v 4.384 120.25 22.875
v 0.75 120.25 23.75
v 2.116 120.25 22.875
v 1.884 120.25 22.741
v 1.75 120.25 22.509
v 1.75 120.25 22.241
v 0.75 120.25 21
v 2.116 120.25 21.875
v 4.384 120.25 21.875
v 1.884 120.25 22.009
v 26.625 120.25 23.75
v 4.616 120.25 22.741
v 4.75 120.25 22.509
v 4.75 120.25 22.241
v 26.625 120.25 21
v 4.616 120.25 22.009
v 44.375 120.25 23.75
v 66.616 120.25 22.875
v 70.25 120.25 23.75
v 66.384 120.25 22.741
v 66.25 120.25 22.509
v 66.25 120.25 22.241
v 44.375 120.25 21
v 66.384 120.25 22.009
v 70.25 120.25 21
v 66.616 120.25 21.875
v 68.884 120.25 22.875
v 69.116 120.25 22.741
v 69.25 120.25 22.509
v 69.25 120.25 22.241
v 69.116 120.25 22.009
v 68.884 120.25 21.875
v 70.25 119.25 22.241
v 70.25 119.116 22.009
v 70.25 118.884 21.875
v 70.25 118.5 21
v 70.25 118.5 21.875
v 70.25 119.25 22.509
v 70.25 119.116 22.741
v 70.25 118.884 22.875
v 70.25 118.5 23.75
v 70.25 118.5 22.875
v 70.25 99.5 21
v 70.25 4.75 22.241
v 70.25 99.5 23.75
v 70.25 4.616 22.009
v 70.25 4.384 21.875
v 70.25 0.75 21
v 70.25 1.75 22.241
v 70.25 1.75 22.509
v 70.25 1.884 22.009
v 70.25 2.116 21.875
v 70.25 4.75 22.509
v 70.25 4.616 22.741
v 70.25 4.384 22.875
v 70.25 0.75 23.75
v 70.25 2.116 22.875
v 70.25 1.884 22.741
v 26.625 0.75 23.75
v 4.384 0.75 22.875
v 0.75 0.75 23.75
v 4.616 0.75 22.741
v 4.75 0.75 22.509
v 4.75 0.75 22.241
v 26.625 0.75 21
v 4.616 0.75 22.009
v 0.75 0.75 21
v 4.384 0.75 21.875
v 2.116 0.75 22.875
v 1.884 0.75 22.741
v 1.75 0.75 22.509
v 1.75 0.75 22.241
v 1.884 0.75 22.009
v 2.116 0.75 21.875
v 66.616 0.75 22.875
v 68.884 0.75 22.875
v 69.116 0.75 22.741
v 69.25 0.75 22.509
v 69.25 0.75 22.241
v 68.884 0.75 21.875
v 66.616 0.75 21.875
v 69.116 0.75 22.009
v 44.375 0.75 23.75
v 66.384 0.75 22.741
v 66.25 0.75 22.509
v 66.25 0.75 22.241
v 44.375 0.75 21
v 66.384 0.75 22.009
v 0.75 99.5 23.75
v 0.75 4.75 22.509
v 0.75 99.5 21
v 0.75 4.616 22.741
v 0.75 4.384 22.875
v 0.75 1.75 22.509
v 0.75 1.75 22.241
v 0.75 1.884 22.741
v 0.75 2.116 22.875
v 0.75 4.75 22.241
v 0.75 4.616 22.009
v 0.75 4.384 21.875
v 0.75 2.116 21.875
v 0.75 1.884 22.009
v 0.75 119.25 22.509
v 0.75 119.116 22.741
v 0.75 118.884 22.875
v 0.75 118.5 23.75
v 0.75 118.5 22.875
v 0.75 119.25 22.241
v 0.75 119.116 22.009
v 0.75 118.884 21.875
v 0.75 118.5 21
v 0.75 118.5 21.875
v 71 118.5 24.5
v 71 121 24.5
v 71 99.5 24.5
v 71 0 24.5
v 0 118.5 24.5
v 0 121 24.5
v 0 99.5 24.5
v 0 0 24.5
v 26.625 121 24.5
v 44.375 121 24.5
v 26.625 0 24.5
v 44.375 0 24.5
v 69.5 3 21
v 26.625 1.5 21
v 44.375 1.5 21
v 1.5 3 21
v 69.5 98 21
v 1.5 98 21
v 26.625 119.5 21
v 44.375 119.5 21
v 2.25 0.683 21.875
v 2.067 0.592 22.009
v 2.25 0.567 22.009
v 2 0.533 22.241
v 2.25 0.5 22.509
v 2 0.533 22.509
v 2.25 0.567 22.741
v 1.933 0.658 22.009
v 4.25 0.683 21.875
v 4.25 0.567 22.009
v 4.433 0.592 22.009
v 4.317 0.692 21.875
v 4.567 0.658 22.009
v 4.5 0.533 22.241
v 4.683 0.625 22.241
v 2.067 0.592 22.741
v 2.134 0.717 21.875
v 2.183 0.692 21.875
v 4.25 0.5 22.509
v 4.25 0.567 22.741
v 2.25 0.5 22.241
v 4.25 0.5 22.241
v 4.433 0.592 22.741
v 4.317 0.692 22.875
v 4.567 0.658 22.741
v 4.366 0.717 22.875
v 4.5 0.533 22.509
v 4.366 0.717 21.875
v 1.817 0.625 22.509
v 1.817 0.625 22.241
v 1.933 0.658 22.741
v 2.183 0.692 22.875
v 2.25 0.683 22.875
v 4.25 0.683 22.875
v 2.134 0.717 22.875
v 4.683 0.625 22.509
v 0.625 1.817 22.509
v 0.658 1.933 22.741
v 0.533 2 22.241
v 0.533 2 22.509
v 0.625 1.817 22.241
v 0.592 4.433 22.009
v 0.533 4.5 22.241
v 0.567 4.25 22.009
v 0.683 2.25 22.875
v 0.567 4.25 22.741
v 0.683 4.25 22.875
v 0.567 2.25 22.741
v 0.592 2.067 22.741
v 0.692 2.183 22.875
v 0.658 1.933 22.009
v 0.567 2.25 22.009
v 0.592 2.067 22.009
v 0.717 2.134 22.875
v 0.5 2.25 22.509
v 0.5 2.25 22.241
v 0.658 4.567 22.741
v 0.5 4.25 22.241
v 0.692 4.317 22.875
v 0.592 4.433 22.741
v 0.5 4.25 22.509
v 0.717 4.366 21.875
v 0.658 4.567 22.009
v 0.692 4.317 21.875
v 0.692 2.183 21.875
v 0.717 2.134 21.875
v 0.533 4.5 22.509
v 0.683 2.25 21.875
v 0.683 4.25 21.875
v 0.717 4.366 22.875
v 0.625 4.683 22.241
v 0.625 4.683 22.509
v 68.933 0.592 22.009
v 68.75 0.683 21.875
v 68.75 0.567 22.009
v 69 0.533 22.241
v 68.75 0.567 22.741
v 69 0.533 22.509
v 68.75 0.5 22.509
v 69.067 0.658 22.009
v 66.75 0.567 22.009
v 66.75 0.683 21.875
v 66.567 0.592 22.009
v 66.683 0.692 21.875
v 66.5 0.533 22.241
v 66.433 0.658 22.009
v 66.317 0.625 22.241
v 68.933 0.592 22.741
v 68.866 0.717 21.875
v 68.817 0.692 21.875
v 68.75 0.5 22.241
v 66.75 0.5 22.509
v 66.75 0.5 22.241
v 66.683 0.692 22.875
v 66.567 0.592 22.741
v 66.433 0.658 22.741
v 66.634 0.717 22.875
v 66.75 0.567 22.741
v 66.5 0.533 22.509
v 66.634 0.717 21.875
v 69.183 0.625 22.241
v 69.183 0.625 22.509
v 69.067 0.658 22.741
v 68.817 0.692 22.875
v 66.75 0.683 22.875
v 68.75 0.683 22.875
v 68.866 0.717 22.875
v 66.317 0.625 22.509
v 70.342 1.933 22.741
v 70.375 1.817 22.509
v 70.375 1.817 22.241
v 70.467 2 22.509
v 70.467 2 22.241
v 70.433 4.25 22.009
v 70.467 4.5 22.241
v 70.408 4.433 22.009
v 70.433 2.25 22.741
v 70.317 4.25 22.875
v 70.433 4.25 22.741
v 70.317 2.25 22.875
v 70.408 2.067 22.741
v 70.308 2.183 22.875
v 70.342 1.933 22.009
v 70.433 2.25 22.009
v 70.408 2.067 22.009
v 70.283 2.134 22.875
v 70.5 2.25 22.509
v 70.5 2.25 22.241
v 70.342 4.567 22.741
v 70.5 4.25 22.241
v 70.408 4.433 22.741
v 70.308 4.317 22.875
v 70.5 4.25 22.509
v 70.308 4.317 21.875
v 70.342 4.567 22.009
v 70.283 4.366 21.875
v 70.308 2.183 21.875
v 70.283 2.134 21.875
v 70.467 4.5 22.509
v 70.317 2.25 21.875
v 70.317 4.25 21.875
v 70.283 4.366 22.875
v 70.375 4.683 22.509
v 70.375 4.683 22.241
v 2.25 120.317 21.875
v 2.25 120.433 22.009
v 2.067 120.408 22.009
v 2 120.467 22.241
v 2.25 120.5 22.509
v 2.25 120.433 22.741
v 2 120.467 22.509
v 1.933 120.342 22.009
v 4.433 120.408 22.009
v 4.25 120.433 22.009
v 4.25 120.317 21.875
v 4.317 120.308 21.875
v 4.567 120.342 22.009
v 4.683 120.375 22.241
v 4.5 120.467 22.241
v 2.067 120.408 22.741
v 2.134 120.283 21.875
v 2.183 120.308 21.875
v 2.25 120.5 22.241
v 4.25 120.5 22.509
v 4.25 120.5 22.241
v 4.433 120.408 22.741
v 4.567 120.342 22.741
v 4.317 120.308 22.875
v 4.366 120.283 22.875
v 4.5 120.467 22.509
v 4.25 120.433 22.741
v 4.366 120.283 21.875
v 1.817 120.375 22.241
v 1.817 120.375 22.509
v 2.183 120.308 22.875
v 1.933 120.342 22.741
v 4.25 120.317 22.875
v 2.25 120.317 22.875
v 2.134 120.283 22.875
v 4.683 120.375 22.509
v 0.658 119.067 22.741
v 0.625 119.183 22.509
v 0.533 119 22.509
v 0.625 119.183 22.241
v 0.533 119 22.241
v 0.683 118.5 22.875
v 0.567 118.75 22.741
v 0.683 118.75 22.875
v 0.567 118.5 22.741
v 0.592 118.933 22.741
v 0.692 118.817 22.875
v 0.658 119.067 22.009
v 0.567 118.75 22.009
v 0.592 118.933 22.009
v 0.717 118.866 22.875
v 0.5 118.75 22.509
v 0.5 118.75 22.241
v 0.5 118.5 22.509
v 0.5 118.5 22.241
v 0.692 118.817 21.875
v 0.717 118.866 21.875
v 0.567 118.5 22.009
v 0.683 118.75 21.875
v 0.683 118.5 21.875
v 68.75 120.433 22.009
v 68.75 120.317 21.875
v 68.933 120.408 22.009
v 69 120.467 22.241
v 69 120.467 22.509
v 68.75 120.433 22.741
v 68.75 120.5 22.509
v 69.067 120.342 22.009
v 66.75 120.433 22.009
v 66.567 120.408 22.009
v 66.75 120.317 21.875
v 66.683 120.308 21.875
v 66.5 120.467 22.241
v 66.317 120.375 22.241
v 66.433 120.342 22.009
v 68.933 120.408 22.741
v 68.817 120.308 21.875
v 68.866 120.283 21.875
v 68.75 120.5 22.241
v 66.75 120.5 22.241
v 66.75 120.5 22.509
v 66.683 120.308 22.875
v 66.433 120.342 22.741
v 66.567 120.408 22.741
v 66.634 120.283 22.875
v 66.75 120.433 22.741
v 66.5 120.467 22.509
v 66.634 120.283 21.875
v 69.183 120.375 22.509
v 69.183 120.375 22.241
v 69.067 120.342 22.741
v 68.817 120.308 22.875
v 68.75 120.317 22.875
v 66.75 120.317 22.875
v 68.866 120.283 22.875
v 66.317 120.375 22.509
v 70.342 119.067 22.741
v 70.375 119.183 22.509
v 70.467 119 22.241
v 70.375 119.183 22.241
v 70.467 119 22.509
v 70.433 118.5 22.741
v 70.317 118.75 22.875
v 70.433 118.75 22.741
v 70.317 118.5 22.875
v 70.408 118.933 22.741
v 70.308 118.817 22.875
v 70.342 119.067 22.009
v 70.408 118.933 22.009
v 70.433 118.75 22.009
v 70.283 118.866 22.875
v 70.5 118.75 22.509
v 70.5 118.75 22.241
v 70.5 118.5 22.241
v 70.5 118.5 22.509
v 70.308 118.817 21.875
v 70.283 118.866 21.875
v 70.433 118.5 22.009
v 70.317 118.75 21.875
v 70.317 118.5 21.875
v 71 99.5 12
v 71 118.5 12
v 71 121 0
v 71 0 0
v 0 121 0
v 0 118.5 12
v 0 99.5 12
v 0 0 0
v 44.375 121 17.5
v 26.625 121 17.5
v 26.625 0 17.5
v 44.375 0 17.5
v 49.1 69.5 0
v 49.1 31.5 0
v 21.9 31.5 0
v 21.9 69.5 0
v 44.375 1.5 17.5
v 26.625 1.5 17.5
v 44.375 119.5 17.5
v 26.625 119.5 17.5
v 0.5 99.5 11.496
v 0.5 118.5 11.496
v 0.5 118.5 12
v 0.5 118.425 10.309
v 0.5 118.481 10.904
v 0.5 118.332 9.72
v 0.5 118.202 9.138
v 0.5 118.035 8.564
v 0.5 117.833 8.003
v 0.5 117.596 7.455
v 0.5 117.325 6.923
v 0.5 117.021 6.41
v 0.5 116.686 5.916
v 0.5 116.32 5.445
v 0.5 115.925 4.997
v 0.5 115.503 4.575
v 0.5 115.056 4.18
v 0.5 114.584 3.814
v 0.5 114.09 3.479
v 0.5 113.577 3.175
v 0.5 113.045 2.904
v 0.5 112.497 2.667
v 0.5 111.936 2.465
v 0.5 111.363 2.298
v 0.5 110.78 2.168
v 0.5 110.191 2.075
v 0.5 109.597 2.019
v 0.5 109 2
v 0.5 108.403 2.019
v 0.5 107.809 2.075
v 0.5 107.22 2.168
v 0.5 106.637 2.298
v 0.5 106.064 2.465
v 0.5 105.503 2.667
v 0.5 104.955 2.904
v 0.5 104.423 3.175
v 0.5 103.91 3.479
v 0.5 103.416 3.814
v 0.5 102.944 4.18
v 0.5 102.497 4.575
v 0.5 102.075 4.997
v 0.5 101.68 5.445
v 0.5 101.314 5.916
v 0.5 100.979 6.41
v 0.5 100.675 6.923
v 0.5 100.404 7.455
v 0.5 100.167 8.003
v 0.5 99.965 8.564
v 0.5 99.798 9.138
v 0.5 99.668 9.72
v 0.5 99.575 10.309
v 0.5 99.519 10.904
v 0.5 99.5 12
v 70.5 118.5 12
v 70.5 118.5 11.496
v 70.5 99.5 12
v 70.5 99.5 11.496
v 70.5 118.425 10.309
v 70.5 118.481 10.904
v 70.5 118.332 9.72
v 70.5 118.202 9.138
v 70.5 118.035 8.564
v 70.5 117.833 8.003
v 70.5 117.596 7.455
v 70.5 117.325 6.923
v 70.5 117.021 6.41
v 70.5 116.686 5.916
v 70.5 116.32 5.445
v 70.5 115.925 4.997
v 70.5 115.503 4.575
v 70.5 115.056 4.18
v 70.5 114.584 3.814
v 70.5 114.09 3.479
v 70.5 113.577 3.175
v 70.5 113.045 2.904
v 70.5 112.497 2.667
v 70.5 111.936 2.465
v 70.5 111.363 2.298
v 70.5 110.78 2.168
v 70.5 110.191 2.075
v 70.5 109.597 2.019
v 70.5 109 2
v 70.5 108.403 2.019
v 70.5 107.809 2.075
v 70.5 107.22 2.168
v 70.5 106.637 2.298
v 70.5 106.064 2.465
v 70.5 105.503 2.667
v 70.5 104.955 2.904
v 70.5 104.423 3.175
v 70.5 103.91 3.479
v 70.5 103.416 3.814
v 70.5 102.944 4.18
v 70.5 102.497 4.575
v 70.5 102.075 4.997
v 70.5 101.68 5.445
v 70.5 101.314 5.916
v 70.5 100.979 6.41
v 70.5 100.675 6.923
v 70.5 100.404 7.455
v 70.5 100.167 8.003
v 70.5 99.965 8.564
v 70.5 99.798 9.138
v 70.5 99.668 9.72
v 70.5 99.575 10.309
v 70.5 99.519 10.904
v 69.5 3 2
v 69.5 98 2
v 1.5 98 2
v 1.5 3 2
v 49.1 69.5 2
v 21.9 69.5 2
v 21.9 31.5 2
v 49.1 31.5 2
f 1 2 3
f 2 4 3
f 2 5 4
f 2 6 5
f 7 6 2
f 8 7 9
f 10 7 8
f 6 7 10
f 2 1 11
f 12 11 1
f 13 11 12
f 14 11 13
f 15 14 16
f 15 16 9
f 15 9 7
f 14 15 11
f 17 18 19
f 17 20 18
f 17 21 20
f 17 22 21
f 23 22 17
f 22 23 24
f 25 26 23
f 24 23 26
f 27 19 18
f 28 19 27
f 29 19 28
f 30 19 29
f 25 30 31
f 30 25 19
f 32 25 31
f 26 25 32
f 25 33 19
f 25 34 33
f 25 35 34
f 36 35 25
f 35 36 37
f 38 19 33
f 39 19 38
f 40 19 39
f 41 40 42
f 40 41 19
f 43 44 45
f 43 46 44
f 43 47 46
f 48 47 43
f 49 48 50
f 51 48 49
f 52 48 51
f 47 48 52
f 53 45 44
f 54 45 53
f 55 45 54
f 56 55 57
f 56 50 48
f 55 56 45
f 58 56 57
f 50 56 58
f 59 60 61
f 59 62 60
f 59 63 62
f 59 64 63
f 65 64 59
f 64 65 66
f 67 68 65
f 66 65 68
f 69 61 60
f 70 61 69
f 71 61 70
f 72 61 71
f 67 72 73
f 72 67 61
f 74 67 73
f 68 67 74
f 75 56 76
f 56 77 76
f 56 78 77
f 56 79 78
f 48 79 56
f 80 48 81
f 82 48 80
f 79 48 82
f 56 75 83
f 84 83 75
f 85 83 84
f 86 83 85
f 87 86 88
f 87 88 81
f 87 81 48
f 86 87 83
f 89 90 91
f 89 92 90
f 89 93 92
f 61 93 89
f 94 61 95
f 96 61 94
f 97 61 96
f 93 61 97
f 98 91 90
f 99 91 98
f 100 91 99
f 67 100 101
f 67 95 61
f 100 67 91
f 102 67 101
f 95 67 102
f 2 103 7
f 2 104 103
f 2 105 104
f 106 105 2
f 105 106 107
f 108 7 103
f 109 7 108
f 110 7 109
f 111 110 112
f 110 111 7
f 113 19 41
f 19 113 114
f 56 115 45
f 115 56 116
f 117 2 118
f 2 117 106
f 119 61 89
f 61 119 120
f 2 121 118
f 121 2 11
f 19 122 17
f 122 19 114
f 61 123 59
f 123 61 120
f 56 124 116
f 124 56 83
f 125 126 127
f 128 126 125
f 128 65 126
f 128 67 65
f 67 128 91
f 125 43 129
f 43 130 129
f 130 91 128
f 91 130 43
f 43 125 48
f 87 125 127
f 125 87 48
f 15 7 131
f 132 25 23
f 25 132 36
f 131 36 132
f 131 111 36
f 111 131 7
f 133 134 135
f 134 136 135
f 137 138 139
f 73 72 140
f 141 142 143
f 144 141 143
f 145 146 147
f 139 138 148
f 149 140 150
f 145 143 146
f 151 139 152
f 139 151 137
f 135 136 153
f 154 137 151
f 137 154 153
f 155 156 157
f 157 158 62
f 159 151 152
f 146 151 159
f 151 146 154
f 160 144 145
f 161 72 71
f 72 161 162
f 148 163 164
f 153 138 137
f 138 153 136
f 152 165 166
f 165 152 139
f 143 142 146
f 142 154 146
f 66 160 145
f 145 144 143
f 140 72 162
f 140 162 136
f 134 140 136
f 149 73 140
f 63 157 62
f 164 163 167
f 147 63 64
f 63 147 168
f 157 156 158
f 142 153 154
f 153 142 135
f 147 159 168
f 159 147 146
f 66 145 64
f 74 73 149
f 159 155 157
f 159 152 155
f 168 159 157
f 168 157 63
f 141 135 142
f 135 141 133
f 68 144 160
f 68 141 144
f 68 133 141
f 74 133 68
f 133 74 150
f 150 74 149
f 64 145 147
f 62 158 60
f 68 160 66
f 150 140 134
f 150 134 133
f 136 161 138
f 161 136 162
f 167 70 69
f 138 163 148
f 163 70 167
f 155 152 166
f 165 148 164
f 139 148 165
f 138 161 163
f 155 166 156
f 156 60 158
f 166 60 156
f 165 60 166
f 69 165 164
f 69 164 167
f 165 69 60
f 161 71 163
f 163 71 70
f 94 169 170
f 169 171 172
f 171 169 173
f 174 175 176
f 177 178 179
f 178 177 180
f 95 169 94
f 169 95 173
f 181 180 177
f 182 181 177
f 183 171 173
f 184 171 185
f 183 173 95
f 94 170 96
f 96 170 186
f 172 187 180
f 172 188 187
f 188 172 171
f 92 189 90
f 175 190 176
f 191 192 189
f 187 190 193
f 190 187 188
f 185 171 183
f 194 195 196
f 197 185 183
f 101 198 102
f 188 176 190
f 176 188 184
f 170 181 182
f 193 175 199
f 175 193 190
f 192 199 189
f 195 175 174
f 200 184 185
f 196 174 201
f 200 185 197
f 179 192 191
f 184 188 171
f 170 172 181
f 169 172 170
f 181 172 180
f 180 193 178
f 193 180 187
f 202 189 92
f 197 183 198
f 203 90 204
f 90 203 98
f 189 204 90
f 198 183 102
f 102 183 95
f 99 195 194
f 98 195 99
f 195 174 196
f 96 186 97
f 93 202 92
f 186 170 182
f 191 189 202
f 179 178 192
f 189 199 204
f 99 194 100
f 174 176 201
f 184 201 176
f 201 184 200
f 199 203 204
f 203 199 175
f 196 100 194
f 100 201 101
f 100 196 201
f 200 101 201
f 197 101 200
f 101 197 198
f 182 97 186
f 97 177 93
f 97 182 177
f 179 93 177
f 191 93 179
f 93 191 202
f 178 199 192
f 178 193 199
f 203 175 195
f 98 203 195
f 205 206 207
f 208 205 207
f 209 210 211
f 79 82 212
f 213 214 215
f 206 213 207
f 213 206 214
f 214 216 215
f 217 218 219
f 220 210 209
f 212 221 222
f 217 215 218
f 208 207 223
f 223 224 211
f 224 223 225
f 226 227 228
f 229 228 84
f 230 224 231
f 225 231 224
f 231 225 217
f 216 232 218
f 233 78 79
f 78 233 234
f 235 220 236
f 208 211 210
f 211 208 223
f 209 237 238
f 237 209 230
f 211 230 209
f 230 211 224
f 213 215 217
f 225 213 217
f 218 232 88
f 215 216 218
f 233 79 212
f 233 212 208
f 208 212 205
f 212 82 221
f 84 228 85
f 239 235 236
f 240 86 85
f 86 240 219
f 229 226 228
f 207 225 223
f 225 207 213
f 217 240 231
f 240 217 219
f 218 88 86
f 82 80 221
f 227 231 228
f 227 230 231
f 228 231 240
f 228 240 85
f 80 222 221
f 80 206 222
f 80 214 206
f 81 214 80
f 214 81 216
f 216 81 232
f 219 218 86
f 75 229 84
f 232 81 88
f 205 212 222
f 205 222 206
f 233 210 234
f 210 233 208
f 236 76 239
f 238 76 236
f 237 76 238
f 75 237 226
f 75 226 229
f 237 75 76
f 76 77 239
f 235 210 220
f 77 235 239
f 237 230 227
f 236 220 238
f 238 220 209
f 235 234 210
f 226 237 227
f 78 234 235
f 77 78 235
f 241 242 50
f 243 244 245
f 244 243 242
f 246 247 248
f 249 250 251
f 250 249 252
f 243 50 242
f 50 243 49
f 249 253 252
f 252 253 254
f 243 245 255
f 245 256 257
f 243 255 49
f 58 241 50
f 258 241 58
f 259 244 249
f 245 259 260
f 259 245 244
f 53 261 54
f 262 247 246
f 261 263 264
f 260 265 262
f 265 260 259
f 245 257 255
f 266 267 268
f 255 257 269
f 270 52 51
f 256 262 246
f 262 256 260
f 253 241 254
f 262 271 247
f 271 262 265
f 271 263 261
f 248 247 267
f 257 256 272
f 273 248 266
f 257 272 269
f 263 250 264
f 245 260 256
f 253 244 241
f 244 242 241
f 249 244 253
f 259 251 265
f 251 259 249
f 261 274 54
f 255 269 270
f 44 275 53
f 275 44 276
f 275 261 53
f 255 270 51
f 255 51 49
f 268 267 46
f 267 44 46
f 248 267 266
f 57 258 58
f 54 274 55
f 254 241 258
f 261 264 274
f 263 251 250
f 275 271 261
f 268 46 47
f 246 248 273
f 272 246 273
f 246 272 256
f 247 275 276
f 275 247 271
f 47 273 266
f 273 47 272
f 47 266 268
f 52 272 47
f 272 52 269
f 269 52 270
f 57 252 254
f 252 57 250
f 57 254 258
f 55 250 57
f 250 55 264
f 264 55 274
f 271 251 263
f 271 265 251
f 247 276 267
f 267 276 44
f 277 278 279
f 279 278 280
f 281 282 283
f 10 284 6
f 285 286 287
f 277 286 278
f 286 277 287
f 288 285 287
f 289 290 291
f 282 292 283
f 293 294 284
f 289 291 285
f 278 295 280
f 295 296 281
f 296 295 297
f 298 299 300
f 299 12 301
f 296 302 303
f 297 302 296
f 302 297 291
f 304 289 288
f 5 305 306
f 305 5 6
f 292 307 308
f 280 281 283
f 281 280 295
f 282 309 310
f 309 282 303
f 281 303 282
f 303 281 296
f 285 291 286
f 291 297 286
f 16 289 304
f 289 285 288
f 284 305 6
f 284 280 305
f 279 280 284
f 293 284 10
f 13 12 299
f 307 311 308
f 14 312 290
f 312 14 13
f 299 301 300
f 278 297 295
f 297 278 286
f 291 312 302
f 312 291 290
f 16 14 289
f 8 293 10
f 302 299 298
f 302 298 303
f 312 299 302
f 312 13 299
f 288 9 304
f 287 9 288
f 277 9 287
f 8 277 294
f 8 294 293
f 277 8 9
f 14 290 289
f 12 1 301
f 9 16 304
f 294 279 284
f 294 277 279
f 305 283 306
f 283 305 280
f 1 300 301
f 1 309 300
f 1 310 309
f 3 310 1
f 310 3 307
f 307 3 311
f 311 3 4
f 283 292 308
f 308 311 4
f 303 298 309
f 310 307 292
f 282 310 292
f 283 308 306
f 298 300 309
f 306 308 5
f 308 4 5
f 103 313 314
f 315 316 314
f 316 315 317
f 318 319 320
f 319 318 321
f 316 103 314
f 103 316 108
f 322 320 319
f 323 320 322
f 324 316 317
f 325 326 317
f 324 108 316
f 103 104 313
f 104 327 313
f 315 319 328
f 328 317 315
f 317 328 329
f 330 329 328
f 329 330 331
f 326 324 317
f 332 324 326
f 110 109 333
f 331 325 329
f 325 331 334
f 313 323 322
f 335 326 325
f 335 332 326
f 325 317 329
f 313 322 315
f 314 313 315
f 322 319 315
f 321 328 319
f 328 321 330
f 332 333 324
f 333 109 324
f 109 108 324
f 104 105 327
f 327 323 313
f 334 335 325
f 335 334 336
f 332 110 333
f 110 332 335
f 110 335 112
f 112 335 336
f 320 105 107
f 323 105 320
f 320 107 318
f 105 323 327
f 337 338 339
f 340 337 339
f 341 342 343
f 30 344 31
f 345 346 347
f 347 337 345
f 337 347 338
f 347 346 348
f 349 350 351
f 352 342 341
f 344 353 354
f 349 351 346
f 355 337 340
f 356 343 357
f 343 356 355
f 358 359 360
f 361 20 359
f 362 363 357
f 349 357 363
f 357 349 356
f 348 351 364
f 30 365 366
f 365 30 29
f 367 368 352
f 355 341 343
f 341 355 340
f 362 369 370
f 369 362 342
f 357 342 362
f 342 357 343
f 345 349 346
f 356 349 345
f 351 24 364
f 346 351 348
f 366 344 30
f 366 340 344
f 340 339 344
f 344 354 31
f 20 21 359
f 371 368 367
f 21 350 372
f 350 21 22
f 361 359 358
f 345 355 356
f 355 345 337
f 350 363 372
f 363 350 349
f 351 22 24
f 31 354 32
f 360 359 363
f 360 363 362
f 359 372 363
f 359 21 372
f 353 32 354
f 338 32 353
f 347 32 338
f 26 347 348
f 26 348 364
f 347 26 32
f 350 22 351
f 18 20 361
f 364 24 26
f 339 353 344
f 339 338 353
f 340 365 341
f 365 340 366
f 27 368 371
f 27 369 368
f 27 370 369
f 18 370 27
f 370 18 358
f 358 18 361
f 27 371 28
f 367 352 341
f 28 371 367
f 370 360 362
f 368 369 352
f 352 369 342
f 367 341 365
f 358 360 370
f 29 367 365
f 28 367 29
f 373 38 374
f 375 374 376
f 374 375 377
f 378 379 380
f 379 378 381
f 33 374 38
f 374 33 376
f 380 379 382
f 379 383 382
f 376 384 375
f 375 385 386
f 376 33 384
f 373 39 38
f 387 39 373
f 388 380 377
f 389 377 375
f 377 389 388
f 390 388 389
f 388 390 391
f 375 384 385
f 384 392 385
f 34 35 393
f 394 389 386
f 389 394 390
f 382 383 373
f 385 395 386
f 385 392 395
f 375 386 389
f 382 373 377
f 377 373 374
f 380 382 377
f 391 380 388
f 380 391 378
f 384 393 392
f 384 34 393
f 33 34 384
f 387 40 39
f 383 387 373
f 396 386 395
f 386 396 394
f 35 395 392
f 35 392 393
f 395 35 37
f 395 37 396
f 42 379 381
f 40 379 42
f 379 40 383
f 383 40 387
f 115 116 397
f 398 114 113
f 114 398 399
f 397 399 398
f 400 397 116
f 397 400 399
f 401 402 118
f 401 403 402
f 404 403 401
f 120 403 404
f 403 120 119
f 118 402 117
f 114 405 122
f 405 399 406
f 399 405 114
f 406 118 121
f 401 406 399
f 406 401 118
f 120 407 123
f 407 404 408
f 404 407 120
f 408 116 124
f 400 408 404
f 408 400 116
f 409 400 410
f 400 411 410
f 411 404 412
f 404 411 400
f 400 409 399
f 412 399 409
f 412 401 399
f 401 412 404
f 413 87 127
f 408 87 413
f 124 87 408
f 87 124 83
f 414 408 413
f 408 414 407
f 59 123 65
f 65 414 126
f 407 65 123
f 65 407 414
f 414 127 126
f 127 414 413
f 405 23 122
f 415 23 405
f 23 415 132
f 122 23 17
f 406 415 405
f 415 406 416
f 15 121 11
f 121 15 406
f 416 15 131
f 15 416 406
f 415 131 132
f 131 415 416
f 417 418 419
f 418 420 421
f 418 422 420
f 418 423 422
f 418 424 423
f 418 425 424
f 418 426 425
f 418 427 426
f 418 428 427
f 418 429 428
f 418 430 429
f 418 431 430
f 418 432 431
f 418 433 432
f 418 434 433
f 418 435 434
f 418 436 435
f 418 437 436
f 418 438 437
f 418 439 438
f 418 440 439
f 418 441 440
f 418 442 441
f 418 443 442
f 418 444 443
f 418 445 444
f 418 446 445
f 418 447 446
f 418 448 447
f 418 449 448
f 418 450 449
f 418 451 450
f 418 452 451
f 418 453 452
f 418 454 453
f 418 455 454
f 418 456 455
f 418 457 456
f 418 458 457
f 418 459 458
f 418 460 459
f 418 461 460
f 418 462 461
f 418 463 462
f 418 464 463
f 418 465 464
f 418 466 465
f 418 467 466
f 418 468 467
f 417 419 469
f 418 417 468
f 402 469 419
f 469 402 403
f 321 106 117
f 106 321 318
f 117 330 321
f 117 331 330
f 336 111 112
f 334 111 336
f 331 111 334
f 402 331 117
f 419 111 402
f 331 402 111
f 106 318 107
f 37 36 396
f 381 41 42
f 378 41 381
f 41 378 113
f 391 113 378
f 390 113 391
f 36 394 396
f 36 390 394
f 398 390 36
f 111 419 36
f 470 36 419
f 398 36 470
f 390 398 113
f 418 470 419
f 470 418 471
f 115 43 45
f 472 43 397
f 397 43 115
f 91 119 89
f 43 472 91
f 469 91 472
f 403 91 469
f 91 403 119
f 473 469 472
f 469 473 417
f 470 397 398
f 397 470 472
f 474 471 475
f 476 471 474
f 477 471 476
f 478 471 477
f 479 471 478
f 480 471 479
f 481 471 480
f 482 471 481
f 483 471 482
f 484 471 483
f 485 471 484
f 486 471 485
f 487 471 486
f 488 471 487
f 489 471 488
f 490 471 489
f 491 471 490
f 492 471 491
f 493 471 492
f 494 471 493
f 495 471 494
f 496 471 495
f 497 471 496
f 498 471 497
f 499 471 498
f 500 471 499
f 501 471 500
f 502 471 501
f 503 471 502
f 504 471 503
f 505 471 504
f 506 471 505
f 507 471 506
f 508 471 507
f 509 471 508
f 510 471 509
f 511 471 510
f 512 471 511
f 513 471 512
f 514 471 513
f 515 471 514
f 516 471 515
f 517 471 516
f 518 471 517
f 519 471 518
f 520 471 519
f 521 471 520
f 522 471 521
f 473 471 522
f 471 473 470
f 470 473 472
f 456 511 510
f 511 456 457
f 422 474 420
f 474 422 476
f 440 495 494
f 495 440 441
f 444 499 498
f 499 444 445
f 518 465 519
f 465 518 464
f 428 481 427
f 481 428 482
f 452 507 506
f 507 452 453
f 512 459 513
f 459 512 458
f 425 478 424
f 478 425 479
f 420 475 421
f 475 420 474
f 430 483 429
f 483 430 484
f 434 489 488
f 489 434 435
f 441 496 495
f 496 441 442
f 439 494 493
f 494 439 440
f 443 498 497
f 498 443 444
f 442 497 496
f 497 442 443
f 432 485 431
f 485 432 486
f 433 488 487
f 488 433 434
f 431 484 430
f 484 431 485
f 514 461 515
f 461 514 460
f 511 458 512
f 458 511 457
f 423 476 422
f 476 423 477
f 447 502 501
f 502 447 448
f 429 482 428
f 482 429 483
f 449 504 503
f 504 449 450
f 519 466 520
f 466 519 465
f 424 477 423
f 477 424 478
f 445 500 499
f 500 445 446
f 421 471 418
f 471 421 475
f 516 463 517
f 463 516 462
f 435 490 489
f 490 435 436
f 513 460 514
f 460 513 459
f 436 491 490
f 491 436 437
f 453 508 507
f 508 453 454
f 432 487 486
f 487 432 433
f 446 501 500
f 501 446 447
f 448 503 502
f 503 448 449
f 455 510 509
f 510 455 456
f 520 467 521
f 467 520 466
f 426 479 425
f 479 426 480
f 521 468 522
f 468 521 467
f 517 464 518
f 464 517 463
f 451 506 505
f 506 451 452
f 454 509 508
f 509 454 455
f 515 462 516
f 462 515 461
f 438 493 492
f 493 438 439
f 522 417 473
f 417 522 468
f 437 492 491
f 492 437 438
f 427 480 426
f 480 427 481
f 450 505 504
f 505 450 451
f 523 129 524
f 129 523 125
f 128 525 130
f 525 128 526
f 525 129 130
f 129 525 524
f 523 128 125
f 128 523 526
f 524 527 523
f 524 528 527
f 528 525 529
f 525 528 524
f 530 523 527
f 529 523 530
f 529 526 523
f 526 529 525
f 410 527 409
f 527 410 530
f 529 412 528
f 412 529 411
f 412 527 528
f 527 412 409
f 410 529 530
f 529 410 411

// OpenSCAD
include <boardgame_insert_toolkit_lib.bill.scad>;

// determines whether lids are output.
g_b_print_lid = f;

// determines whether boxes are output.
g_b_print_box = t; 

// Focus on one box
g_isolated_print_box = ""; 

g_wall_thickness = 1.5;

lid_parms = 
[
    [ LID_PATTERN_RADIUS,4],        
    [ LID_INSET_B, t ],
    [ LID_TABS_4B, [ t,t,f,f]],
    [ LID_FIT_UNDER_B, f],
    [ LID_LABELS_INVERT_B, f],
 ];

function makeFaction( label ) = 
    [   label,
        [
            [ BOX_SIZE_XYZ,                 [71, 121, 21] ],    
            [ BOX_LID,
                [
                    [ LID_PATTERN_RADIUS,4],        
                    [ LID_INSET_B, t ],
                    [ LID_TABS_4B, [ t,t,f,f]],
                    [ LID_FIT_UNDER_B, f],
                    [ LID_LABELS_INVERT_B, t],
                    [ LABEL,
                        [
                            [ LBL_TEXT,     label ],
                            [ LBL_SIZE,     10 ],
                            [ ROTATION,     90 ],
                            [ LBL_FONT,     "Orthodox Herbertarian:style=Regular"],
                        ]
                    ],
                ],
            ],
                         
            // troops
            [ BOX_COMPONENT,
                [
                    [CMP_COMPARTMENT_SIZE_XYZ,[ 70, 19, 19] ],
                    [CMP_NUM_COMPARTMENTS_XY,[1,1] ], 
                    [CMP_SHAPE_ROTATED_B,t],
                    [CMP_SHAPE, ROUND ],  
                    [POSITION_XY,[CENTER, 98 ] ],   
                    [CMP_MARGIN_FBLR, [ 0, 0, 3, 3 ]],
                    [CMP_PADDING_HEIGHT_ADJUST_XY,[-9, 0] ],
                    [CMP_PADDING_XY,[15,2]],


                ]
            ],

            // cards 
            [ BOX_COMPONENT,
                [
                    [CMP_NUM_COMPARTMENTS_XY,   [1,1]],
                    [CMP_COMPARTMENT_SIZE_XYZ,  [ 68, 95, 19] ],
                    [CMP_CUTOUT_BOTTOM_B,t],
                    [CMP_CUTOUT_BOTTOM_PCT,0.4],
                    [POSITION_XY, [CENTER,1.5]],
                ]
            ],
                     
        ]
    ];

//////////////////

data =
[

    //makeFaction( "ATREIDES" ),
    //makeFaction( "HARKONNEN" ),
    //makeFaction( "BENE GESSERIT" ),
    //makeFaction( "FREMEN" ),
    //makeFaction( "EMPEROR" ),
    //makeFaction( "GUILD" ),
    //makeFaction( "IXIAN" ),
    //makeFaction( "TLEILAXU" ),
    //makeFaction("RICHESE"),
    makeFaction("CHOAM")

];


MakeAll();
